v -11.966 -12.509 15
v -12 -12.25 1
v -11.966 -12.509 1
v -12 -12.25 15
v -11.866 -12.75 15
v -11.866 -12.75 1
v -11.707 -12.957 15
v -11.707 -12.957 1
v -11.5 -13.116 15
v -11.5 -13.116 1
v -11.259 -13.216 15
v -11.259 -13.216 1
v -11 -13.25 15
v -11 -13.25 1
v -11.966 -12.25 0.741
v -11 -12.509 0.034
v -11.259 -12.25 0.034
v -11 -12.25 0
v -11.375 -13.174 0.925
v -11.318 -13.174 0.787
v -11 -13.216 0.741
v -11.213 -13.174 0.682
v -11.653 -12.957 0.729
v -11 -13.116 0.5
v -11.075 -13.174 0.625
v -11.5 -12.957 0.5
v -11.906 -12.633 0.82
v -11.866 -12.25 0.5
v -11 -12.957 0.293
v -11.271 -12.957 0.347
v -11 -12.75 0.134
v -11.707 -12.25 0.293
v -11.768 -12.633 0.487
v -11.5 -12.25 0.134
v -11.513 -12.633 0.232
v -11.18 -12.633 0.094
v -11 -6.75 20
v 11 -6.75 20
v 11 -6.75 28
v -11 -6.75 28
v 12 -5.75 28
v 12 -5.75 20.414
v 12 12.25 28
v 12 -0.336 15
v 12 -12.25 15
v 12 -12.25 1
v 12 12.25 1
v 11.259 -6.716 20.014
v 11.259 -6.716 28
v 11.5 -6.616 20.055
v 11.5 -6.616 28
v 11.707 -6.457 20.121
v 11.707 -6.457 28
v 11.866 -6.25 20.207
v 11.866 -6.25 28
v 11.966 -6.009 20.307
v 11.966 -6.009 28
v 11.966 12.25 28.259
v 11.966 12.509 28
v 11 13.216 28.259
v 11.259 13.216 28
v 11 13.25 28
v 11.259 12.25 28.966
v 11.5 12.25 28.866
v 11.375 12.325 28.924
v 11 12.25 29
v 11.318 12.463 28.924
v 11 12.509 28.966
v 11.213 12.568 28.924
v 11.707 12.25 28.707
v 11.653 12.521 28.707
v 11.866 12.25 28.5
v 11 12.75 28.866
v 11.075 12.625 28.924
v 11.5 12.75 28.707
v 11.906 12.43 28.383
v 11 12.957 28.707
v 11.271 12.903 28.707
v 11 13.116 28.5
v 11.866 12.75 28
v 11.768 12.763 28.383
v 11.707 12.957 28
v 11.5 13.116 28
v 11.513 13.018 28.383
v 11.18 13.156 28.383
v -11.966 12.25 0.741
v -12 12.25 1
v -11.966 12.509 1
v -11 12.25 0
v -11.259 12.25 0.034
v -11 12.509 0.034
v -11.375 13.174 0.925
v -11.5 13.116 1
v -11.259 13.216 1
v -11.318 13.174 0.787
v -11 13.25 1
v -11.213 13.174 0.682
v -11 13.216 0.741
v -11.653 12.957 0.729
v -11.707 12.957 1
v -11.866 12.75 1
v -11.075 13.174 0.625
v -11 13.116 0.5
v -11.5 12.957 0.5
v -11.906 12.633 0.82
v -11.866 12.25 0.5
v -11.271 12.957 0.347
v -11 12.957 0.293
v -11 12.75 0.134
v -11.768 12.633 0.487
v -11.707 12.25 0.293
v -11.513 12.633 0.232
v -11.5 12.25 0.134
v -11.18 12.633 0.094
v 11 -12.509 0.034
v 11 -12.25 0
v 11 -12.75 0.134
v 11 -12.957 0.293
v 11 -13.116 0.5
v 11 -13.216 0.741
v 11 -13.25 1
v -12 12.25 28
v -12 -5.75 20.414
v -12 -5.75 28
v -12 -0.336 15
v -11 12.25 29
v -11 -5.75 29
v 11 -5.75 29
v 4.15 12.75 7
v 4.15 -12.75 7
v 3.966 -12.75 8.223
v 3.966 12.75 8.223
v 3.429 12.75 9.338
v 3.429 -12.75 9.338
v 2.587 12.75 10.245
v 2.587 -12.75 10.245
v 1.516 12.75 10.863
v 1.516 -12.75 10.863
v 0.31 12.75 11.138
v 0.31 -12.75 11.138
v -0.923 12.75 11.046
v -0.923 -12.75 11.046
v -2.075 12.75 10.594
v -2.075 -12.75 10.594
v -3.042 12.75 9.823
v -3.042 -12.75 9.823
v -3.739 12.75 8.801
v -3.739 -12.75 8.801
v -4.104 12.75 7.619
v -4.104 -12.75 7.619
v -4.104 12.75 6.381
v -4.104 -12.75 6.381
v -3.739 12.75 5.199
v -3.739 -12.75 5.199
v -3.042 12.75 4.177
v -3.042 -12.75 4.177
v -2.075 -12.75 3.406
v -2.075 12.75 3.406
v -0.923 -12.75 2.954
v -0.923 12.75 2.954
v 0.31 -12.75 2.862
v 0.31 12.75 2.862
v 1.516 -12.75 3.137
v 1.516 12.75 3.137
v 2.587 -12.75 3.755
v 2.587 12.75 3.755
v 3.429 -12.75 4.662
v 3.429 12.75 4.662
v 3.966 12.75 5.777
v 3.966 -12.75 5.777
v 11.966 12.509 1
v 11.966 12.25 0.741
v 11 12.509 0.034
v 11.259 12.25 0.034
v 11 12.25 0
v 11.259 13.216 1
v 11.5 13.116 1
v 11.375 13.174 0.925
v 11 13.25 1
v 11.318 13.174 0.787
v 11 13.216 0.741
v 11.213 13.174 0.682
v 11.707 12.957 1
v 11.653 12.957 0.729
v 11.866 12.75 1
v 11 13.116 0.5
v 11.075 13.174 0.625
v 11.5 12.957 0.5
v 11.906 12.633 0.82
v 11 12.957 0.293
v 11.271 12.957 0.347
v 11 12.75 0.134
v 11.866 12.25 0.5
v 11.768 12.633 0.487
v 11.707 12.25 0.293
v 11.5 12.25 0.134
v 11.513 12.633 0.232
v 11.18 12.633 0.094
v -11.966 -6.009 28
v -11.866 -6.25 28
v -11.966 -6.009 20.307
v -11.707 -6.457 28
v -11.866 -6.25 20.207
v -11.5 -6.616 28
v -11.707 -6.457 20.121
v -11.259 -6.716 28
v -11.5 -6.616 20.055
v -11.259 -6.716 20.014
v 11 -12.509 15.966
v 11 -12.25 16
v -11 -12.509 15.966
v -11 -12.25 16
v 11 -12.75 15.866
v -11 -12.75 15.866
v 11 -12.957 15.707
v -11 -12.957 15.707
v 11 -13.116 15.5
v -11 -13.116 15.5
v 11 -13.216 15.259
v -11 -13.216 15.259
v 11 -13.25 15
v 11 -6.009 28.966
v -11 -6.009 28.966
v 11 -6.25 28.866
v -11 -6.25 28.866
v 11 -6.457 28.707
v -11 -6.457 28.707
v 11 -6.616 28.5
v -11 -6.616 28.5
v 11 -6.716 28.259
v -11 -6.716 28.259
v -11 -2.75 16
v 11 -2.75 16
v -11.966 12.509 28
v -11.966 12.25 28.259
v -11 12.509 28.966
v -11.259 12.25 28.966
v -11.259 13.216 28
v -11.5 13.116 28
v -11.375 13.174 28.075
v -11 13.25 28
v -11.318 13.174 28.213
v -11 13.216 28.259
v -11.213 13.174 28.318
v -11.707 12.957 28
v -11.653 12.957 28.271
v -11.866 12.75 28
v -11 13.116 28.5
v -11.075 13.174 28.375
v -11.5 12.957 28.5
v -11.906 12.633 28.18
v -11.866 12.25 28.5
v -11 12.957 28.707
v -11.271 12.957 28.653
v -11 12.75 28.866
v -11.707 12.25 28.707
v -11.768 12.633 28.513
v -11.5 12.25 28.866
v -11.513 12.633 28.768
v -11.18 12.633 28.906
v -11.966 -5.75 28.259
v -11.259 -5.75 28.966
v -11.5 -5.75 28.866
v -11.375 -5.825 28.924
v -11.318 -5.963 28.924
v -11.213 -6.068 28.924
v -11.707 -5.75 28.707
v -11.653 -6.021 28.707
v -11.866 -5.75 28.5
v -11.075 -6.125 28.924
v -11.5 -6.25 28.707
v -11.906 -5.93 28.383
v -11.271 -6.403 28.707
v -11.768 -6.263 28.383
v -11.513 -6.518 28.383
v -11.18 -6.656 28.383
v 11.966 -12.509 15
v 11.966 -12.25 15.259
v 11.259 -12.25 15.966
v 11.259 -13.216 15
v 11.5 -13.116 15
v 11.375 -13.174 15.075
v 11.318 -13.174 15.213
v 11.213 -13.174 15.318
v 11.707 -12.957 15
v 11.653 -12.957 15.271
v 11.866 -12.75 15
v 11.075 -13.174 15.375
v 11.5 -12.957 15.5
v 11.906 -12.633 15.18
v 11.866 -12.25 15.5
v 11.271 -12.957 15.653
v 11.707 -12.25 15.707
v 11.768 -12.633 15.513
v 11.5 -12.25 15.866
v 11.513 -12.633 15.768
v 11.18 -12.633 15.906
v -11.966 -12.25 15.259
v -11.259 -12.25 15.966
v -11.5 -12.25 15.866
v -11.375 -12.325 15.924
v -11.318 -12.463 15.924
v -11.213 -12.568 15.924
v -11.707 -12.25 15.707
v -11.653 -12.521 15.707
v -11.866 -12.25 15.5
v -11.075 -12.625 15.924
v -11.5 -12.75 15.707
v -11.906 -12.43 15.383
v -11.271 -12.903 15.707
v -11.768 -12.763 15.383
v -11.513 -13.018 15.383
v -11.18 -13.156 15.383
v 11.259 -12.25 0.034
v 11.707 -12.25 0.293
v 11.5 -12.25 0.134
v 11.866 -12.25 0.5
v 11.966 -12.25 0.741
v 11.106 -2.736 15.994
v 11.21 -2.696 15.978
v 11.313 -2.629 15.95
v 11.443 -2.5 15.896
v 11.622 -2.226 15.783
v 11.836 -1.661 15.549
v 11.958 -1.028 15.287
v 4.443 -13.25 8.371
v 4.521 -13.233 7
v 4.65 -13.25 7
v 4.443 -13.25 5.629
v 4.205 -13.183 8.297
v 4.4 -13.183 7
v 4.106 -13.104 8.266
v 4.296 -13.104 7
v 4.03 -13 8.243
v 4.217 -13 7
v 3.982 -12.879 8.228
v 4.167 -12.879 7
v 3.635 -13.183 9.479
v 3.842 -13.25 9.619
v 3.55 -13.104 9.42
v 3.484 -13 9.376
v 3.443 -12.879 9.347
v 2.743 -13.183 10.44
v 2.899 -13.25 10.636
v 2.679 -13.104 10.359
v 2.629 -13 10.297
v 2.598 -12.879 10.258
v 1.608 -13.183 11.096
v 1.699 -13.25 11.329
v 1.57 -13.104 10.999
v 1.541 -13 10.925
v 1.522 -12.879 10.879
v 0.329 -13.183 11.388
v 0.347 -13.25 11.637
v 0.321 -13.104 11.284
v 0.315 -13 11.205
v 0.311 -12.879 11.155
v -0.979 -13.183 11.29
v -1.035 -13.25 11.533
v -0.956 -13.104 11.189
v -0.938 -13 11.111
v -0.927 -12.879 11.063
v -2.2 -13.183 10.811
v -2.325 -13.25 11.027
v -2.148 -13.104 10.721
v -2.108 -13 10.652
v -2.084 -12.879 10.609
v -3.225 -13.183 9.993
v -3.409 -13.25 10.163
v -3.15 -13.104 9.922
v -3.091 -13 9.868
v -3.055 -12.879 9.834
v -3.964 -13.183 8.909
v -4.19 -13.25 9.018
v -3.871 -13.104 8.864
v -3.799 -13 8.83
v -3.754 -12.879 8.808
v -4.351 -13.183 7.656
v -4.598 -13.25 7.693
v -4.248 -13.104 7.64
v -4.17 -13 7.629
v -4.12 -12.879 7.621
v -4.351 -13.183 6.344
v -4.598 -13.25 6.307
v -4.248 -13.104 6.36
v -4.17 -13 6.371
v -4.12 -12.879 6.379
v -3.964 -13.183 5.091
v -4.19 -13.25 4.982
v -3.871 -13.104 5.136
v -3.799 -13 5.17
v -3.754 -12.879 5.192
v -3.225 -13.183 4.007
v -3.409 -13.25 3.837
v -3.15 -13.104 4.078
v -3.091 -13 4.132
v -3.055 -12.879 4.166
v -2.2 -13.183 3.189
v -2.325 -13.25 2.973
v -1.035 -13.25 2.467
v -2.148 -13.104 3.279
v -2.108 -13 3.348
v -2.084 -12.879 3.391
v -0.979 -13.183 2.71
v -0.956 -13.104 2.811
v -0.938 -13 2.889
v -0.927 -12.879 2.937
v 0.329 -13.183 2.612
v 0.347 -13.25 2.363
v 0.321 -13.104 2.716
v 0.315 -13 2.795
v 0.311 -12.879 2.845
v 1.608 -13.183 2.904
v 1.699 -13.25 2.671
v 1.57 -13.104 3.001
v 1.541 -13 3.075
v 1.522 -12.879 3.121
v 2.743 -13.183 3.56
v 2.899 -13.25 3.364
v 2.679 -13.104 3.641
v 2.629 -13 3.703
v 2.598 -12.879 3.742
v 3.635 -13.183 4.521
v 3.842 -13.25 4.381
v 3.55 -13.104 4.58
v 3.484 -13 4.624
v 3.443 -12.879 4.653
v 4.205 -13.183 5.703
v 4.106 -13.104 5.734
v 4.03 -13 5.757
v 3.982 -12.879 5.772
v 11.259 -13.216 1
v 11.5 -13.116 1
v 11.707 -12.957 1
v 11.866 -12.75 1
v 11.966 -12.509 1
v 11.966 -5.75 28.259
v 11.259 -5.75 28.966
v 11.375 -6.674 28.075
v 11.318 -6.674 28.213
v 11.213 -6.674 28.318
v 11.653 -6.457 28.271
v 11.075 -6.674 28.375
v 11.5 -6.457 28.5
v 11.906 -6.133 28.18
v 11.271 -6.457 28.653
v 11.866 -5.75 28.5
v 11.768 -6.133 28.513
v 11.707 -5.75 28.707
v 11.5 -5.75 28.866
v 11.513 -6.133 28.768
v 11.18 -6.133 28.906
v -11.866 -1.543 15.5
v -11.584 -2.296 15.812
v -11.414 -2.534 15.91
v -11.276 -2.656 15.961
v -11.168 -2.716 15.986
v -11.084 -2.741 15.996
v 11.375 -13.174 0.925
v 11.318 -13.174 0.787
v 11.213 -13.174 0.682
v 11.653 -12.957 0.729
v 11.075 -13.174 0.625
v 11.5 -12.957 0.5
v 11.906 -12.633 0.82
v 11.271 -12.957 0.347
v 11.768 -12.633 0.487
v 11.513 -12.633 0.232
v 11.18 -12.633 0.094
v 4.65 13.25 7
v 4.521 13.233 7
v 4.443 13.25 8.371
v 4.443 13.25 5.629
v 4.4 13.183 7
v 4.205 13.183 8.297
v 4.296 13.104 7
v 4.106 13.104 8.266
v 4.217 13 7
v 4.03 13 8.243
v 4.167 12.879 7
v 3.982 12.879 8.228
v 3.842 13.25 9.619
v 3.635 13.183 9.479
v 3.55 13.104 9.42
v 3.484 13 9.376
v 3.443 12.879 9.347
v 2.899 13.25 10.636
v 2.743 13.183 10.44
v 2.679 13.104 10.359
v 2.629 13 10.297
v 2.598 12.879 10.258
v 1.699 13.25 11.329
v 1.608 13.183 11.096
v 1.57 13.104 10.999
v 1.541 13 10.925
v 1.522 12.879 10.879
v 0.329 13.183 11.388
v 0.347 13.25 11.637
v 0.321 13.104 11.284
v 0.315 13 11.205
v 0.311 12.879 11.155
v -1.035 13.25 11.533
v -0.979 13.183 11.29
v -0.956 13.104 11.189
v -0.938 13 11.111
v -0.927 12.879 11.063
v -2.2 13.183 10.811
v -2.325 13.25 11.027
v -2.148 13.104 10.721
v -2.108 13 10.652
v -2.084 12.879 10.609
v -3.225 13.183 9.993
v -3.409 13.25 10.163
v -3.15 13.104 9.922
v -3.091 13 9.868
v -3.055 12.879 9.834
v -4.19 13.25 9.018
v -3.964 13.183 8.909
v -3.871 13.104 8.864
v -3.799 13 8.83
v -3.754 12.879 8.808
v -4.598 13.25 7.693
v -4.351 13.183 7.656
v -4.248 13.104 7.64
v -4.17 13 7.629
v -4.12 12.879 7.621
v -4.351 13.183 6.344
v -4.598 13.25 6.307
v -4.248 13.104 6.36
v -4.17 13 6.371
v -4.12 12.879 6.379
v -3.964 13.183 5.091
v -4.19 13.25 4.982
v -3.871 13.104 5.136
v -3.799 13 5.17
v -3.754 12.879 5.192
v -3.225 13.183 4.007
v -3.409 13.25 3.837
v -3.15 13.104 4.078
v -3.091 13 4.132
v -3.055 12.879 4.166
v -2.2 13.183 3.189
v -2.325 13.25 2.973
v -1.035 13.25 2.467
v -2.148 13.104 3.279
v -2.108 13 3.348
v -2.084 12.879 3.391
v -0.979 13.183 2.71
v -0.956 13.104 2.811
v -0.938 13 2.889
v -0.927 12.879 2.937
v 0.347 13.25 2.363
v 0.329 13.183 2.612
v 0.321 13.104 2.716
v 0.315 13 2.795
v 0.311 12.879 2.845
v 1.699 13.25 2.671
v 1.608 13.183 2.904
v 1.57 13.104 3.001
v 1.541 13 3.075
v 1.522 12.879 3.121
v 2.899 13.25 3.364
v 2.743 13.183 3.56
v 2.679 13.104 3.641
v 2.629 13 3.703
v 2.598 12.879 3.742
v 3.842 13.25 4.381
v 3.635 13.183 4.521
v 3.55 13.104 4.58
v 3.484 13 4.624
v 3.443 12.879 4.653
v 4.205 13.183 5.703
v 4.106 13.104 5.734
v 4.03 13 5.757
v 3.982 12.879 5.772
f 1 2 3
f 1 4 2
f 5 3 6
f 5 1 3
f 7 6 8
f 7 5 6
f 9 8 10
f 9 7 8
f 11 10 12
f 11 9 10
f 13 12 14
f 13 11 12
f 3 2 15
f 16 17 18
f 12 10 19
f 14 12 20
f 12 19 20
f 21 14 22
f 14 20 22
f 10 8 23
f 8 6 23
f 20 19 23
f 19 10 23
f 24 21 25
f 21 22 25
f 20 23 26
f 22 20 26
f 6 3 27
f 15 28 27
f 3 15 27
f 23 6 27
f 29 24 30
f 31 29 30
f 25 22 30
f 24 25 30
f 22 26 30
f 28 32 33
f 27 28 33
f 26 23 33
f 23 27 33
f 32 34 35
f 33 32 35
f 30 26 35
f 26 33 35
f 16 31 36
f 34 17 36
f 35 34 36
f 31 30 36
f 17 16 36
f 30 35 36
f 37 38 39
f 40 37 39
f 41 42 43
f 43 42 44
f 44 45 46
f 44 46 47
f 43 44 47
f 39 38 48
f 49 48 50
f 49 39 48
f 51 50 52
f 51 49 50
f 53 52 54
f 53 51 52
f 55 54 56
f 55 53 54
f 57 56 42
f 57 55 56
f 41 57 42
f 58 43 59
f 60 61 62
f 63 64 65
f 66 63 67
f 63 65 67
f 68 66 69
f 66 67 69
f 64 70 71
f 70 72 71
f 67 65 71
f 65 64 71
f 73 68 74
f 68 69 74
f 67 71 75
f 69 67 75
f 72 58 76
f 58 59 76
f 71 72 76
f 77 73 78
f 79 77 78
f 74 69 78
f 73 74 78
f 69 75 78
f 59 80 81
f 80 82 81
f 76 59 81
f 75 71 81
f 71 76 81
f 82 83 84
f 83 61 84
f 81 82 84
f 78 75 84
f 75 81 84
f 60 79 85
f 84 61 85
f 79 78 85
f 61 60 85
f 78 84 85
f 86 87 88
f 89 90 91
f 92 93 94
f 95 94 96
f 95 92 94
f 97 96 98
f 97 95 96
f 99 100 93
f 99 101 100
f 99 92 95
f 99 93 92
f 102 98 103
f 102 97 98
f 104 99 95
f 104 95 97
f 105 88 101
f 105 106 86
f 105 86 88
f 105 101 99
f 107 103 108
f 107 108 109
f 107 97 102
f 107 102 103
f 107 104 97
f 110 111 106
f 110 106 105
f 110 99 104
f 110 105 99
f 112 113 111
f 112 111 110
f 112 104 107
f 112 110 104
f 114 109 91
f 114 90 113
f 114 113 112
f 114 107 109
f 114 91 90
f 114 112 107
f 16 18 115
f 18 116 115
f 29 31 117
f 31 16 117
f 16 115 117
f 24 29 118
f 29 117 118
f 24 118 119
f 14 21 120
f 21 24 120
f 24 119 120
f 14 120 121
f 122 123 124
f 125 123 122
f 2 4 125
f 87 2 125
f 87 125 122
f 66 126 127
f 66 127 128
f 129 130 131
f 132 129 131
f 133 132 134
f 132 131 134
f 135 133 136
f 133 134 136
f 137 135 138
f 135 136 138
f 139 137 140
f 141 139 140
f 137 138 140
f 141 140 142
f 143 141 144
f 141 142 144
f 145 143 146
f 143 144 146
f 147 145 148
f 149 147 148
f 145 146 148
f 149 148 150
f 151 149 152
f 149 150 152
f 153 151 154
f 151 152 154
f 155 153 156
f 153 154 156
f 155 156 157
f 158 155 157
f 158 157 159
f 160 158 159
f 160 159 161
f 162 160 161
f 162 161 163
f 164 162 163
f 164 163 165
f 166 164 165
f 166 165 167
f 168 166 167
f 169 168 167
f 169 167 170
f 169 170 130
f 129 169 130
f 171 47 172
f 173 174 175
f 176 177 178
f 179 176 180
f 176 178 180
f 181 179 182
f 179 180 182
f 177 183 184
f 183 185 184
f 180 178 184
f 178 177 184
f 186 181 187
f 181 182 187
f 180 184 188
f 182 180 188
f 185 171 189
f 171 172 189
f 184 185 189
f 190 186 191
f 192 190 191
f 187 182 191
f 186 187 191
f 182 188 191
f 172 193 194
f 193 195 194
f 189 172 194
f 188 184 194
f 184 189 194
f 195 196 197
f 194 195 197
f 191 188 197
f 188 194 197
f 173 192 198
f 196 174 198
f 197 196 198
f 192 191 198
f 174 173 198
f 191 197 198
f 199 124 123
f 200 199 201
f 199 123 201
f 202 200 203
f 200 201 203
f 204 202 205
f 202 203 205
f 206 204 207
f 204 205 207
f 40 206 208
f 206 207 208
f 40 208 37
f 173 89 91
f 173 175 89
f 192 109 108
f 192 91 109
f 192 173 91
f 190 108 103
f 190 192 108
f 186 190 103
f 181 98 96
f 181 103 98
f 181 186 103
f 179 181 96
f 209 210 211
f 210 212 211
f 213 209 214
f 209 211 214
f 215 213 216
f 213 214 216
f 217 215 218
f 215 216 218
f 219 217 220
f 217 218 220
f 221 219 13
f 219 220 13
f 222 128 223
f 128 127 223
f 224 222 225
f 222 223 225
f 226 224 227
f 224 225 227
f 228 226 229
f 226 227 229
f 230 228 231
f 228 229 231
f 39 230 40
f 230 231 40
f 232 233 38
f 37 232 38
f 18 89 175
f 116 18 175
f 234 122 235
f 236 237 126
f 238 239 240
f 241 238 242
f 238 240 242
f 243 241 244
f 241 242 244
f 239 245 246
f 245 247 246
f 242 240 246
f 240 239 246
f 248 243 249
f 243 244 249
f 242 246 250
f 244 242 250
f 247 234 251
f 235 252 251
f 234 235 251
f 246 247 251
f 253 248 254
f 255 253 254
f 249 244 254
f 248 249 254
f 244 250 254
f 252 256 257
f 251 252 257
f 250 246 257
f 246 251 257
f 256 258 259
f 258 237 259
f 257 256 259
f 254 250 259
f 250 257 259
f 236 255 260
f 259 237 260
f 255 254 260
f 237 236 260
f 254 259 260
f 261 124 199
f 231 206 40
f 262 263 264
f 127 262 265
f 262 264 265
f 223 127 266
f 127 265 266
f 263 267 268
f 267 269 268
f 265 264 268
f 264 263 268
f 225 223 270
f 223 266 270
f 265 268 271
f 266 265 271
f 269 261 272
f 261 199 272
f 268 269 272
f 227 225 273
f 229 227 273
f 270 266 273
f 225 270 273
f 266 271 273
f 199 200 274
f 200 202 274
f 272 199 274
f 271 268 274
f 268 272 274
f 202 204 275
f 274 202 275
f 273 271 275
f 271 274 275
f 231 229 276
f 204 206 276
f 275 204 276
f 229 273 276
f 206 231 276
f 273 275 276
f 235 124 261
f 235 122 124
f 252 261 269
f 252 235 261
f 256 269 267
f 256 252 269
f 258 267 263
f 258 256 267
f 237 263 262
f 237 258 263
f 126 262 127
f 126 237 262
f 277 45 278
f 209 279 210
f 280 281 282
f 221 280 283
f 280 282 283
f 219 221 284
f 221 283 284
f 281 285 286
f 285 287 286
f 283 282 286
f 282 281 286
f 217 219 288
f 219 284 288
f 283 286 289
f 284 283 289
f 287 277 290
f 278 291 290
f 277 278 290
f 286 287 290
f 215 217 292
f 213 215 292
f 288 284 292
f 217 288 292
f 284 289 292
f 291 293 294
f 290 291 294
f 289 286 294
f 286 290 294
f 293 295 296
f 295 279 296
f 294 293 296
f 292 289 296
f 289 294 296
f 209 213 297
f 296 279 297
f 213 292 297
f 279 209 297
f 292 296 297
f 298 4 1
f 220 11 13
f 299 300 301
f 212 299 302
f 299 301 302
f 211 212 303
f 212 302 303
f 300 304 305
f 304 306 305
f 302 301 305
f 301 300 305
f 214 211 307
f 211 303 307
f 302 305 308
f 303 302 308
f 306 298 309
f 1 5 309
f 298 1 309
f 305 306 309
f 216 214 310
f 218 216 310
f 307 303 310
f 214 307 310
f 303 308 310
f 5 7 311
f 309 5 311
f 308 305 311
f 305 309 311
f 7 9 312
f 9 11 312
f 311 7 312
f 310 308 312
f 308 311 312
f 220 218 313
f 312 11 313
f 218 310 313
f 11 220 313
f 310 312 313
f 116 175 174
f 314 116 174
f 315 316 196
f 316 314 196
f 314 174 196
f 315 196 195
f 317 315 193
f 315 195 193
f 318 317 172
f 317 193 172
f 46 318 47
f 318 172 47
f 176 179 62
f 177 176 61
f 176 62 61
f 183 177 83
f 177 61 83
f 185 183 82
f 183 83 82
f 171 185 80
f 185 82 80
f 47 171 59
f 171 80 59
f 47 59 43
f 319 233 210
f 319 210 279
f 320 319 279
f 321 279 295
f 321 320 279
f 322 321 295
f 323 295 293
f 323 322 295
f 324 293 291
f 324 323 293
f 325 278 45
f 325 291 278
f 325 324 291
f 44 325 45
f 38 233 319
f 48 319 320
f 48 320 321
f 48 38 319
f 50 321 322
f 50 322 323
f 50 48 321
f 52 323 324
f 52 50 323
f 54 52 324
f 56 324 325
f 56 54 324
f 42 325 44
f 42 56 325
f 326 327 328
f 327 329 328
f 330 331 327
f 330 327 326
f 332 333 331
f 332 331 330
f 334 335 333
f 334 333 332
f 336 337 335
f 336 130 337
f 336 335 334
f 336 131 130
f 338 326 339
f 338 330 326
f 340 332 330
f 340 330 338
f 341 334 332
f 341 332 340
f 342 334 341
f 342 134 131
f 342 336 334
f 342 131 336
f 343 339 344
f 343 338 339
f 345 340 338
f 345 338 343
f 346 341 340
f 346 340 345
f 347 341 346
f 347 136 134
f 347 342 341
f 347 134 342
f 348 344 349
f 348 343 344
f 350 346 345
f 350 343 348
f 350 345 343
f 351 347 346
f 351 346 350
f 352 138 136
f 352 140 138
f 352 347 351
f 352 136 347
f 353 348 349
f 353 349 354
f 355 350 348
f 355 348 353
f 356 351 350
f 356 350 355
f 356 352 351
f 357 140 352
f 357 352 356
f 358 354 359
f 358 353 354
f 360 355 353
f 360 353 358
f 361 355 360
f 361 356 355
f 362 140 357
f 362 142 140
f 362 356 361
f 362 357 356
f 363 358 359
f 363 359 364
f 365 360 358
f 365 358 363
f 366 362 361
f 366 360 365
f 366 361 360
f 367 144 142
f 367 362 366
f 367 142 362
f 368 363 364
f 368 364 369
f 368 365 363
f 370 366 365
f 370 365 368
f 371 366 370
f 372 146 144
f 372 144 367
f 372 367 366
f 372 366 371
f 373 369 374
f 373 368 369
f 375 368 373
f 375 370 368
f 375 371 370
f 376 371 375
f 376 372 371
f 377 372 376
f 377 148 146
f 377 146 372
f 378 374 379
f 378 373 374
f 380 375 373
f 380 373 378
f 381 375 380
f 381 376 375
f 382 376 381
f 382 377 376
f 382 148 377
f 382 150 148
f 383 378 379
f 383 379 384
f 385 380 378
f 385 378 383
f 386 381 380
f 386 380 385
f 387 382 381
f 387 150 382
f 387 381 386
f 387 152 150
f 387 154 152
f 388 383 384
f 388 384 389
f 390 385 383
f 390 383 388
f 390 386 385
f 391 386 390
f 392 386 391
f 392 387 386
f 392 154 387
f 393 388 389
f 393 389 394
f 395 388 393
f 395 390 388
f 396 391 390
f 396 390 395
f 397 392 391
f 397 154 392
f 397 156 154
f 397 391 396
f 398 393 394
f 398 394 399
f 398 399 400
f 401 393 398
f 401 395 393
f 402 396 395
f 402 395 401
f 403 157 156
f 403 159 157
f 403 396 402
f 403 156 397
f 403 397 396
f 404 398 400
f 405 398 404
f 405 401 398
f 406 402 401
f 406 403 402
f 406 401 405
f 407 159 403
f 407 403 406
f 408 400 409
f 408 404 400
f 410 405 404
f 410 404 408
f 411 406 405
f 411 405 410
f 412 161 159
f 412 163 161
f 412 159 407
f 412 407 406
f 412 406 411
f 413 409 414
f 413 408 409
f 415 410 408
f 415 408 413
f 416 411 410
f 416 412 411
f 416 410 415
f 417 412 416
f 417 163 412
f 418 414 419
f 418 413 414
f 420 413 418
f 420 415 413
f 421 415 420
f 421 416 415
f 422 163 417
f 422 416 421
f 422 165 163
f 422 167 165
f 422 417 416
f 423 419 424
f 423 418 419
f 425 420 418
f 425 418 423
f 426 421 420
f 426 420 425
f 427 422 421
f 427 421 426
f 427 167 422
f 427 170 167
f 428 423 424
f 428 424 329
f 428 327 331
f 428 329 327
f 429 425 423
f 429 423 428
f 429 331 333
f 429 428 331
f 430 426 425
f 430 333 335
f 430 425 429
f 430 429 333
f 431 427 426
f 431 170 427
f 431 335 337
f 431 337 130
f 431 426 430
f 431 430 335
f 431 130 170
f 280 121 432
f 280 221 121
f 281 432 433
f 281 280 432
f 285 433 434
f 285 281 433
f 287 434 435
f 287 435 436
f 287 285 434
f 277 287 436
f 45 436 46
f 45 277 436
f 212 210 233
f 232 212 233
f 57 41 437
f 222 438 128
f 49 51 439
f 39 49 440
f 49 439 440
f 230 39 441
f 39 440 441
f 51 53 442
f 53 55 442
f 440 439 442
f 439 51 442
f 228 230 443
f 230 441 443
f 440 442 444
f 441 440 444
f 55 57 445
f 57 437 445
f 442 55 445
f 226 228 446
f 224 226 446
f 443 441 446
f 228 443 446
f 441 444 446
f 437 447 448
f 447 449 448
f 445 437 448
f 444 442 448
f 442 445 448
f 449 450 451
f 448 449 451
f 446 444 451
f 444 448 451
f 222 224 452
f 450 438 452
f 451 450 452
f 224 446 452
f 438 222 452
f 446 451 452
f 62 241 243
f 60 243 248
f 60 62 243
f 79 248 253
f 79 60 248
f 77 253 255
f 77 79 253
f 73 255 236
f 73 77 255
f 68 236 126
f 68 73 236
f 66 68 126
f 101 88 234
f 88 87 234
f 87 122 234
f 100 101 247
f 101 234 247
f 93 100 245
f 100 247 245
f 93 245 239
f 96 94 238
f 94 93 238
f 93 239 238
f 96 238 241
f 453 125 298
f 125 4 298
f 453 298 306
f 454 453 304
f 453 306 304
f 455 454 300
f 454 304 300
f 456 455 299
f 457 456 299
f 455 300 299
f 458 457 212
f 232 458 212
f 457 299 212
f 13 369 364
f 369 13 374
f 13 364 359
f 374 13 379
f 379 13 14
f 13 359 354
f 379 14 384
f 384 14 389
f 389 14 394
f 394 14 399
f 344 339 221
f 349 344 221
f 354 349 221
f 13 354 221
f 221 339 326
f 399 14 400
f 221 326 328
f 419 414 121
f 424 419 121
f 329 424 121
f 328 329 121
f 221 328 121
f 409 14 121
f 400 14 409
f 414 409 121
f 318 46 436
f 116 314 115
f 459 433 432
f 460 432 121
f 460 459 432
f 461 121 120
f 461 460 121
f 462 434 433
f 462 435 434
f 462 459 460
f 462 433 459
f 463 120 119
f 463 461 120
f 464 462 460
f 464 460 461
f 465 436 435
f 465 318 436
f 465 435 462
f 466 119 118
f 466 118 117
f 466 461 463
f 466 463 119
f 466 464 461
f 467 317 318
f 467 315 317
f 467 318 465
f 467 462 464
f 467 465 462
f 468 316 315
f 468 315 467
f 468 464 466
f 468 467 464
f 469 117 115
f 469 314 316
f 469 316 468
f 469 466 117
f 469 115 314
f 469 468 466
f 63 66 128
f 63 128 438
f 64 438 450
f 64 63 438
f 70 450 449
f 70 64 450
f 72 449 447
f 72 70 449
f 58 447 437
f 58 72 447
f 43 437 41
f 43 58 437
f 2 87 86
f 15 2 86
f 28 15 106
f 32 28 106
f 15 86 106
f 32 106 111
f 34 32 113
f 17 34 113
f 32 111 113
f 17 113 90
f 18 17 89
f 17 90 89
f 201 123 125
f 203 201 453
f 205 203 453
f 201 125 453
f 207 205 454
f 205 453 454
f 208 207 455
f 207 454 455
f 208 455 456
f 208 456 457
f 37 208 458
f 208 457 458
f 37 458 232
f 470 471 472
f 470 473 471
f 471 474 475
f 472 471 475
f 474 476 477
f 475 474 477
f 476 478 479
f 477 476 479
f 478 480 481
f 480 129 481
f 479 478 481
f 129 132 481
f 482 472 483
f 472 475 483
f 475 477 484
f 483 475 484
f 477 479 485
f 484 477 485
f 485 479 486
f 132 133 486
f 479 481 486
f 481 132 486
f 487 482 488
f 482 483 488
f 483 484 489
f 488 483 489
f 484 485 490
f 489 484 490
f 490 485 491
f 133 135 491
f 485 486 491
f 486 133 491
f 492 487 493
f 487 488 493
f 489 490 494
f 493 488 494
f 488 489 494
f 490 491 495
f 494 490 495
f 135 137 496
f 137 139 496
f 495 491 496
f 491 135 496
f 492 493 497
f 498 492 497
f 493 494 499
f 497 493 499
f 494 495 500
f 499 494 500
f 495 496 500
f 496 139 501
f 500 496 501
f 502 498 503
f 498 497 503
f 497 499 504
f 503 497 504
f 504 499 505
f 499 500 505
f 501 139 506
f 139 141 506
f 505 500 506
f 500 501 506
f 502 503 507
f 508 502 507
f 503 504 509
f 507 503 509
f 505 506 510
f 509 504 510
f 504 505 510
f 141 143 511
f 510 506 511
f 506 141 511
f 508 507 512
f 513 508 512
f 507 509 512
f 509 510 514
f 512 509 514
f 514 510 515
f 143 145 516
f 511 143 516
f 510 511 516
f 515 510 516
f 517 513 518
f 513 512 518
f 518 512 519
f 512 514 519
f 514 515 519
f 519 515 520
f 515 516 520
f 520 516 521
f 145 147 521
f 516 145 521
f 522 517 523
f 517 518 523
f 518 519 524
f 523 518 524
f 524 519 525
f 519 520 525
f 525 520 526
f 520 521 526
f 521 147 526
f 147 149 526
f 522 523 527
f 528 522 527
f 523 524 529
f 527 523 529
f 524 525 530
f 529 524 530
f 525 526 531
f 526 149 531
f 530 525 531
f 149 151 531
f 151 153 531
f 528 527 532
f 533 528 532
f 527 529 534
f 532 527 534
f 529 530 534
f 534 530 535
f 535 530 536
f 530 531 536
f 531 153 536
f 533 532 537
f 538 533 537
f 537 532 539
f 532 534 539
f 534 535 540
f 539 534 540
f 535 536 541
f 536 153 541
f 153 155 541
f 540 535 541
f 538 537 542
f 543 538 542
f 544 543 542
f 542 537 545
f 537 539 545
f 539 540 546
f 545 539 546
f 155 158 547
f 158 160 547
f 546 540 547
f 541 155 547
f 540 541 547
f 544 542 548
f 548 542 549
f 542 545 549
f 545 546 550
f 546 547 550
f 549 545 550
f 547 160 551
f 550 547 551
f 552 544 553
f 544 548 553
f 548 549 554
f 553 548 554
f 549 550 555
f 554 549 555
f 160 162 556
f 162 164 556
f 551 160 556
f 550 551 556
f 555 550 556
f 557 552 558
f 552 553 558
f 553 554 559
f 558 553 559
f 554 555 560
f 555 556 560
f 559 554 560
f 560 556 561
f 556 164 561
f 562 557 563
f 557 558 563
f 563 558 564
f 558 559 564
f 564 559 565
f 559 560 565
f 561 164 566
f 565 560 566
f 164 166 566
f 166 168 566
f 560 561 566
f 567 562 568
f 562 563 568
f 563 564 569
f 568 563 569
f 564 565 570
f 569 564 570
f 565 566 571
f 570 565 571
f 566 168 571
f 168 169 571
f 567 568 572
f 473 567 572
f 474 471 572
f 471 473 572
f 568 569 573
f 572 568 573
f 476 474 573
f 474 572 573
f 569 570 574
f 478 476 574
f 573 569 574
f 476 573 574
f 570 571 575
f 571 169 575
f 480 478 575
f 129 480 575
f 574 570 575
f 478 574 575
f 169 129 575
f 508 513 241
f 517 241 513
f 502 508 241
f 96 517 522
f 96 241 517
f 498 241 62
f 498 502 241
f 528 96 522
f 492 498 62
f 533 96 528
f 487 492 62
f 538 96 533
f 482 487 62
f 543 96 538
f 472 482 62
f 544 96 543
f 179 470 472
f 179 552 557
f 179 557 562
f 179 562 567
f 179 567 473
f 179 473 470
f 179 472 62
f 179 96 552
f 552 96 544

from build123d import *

# Parameters (mm, degrees)
F0_W     = 24
F0_H     = 26.5
F1_DEPTH = 29
F3_DEPTH = 25
F4_R     = 4.15
F5_DEPTH = 31
F6_R     = 1
F7_R     = 0.5


with BuildPart() as f1:
    # F0 (on Top) → F1 (new body)
    with BuildSketch(Plane.XY):
        Rectangle(F0_W, F0_H)
    extrude(amount=F1_DEPTH)

    # F2 (on face) → F3 (cut)
    with BuildSketch(Plane.YZ.offset(12)):
        Polygon((-6.75, 20), (-6.75, 29), (-13.25, 29), (-13.25, 16), (-2.75, 16), align=None)
    extrude(amount=-F3_DEPTH, mode=Mode.SUBTRACT)

    # F4 (on face) → F5 (cut)
    with BuildSketch(Plane.XZ.offset(13.25)):
        with Locations((0, 7)):
            Circle(F4_R)
    extrude(amount=-F5_DEPTH, mode=Mode.SUBTRACT)

    # F6
    f6_edges = [f1.edges().sort_by_distance(p)[0] for p in [
        (12, 0, 0),
        (12, 13.25, 14.5),
        (12, 3.25, 29),
        (12, -6.75, 24.5),
        (12, -4.75, 18),
        (12, -8, 16),
        (12, -13.25, 8),
        (-12, 0, 0),
        (-12, -13.25, 8),
        (-12, -8, 16),
        (-12, -4.75, 18),
        (-12, -6.75, 24.5),
        (-12, 3.25, 29),
        (-12, 13.25, 14.5),
        (0, -6.75, 29),
        (0, 13.25, 29),
        (0, 13.25, 0),
        (0, -13.25, 0),
        (0, -13.25, 16),
    ]]
    fillet(f6_edges, radius=F6_R)

    # F7
    f7_edges = [f1.edges().sort_by_distance(p)[0] for p in [
        (-4.15, 13.25, 7),
        (-4.15, -13.25, 7),
    ]]
    fillet(f7_edges, radius=F7_R)


solid = f1.part
